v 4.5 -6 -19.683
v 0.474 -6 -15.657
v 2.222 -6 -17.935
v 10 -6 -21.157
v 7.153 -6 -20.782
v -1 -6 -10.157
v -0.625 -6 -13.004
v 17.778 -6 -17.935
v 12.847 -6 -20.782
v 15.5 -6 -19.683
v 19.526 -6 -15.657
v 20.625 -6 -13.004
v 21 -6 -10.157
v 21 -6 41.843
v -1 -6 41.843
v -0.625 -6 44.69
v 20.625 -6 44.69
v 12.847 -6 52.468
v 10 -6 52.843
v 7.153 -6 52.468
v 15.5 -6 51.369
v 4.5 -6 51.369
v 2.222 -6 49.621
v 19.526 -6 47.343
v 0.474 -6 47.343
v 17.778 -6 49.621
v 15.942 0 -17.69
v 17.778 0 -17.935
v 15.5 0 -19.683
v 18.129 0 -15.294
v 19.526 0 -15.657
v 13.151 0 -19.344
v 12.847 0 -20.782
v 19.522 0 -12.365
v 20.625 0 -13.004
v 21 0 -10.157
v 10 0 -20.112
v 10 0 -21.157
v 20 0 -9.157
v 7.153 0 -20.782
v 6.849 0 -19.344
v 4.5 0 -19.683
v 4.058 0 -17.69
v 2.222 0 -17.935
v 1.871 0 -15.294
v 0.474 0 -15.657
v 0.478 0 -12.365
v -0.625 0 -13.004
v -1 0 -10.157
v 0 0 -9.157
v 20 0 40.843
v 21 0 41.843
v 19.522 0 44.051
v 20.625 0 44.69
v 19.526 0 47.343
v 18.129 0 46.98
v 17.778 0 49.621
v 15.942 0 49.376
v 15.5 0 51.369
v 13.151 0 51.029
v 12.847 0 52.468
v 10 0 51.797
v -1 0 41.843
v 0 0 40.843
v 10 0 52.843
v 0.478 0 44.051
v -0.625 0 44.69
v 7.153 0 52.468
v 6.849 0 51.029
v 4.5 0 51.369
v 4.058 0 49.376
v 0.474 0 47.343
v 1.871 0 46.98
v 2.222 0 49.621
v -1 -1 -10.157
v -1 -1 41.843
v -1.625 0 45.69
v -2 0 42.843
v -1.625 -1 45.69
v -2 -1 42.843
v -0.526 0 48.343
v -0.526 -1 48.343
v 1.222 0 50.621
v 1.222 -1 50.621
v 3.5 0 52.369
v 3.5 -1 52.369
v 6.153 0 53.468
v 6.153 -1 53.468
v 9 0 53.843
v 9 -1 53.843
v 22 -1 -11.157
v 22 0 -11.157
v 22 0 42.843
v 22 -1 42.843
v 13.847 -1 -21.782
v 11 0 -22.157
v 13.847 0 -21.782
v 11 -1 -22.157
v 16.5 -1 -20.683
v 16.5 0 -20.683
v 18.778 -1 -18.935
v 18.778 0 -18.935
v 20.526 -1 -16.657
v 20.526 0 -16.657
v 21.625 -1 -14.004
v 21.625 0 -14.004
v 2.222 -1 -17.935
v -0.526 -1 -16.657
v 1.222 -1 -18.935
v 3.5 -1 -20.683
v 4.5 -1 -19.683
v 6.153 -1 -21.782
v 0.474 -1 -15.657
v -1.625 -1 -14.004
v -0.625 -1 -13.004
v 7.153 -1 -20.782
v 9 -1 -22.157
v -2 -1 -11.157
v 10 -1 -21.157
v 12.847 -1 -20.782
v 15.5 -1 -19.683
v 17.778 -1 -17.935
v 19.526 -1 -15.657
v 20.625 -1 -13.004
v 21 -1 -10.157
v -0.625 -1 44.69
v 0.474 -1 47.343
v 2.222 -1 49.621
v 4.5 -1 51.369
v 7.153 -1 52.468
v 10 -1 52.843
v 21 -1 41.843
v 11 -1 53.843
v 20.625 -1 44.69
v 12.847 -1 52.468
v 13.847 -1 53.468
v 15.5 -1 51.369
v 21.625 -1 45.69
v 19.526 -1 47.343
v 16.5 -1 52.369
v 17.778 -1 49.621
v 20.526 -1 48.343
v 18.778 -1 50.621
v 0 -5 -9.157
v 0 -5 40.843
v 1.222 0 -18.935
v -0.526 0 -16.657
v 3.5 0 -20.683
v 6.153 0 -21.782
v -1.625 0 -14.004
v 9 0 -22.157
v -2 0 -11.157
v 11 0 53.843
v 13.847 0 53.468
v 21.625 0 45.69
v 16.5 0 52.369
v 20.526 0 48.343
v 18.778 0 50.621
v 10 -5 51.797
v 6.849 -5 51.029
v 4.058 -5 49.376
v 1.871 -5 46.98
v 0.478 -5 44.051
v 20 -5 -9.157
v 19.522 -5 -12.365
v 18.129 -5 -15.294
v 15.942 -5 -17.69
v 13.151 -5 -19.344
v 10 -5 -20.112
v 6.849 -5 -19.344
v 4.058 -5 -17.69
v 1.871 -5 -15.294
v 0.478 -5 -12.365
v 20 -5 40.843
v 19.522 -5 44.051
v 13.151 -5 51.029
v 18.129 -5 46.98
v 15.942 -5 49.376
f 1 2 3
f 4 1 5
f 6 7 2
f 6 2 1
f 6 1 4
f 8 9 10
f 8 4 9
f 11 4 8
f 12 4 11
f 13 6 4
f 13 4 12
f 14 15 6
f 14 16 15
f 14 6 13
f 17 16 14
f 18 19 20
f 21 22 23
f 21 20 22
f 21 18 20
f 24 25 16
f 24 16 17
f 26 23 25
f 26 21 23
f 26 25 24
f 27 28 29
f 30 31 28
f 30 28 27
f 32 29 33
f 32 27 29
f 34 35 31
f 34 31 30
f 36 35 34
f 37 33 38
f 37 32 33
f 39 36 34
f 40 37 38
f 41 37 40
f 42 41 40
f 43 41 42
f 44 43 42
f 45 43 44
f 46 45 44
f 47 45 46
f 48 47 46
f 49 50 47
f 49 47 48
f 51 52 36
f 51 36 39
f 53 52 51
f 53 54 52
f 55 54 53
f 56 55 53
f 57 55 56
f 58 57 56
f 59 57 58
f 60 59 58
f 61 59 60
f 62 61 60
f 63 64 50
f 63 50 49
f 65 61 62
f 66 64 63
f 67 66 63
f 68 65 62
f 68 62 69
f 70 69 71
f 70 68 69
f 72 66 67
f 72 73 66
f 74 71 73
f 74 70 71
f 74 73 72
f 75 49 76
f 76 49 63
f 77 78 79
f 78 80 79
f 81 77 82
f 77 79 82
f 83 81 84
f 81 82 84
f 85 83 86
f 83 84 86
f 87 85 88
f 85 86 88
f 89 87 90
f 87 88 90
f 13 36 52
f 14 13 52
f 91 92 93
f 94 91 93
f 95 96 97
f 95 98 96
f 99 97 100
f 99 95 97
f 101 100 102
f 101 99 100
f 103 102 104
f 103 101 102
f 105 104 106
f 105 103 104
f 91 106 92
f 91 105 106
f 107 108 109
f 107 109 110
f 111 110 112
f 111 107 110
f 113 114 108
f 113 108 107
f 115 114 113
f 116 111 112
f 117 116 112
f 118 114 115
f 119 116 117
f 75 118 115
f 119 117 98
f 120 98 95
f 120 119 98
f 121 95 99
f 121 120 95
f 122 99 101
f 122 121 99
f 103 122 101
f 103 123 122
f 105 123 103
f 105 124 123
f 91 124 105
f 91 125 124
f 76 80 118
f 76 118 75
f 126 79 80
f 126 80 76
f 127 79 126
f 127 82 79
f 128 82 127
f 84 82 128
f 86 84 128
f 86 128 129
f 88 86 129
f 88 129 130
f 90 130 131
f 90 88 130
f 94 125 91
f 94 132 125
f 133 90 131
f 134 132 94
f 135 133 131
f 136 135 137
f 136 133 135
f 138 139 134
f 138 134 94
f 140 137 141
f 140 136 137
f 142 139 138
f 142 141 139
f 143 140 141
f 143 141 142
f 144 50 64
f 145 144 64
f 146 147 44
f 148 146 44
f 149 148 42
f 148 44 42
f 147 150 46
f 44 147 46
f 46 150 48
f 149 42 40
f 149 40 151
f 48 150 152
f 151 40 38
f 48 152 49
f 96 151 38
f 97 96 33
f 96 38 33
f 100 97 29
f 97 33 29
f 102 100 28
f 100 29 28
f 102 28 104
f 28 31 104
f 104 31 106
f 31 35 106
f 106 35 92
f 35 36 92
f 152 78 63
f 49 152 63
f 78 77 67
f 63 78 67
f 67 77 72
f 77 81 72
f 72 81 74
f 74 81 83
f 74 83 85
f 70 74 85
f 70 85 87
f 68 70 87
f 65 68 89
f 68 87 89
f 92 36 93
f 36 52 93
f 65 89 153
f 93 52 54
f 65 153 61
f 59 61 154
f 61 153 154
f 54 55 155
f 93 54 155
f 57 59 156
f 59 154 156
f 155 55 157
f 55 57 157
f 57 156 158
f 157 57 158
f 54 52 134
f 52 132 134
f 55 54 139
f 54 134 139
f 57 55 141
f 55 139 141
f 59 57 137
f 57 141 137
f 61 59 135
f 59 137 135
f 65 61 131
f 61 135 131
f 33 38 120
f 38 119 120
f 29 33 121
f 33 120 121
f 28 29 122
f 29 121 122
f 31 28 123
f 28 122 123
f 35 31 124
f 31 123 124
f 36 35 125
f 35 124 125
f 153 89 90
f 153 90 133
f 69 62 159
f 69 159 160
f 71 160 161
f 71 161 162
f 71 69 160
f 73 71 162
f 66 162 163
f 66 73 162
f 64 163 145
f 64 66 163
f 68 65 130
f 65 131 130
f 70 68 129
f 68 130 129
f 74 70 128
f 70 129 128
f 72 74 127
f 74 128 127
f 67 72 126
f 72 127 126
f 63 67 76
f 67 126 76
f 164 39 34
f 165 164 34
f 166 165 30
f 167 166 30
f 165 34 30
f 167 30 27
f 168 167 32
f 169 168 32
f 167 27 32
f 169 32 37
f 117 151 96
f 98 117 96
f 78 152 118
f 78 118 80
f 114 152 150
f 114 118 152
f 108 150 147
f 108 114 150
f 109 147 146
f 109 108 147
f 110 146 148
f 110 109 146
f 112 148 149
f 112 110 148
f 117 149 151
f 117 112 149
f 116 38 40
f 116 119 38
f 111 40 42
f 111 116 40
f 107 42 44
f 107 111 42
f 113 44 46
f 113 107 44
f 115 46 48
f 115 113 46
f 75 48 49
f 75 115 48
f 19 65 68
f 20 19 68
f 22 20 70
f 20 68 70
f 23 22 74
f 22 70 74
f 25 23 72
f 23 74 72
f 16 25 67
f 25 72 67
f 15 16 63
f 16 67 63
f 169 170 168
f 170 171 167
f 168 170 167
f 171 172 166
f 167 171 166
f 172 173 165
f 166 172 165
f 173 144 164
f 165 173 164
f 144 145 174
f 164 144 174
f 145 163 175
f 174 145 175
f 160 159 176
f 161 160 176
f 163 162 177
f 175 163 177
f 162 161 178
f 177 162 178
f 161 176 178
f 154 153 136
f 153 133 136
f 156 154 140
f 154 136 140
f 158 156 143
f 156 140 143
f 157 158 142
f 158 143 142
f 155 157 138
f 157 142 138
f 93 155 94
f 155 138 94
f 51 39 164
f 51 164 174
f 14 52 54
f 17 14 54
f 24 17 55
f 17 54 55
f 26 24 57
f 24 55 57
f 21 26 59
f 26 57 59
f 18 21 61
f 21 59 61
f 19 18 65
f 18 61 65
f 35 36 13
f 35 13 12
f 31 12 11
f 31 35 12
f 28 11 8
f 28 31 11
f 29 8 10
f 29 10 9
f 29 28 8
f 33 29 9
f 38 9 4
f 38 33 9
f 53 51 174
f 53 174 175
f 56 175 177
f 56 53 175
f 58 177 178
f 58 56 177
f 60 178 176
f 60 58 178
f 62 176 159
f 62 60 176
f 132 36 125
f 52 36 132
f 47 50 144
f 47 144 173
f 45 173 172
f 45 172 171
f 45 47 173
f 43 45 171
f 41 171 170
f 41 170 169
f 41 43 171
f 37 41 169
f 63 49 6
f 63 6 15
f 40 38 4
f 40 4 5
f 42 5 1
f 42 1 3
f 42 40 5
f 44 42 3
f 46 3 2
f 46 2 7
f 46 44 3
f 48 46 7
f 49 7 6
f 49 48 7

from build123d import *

# Parameters (mm, degrees)
F0_W          = 22
F0_H          = 74
F0_W_2        = 20
F0_H_2        = 72
F1_DEPTH      = 6
F0_W_3        = 24
F0_H_3        = 76
F2_DEPTH      = 1
F3_DEPTH      = 5
F4_F1_R       = 10.9999
F4_F2_R       = 11
F4_2_T1_DEPTH = 5
F4_2_T3_DEPTH = 61


# Not quite as in the source:
# - a fillet or chamfer that OpenCascade refuses, or shapes differently, is made with other operations: its cross-section is extruded or revolved along the edge and cut away or added
# - a fillet or chamfer is up to 0.001 mm smaller than in the source, because OpenCascade refuses the exact size


with BuildPart() as f1:
    # F0 (on Front) → F1 (new body)
    with BuildSketch(Plane.XZ):
        with Locations((10, 15.842890054)):
            Rectangle(F0_W, F0_H)
        with Locations((10, 15.842890054)):
            Rectangle(F0_W_2, F0_H_2, mode=Mode.SUBTRACT)
        with Locations((10, 15.842890054)):
            Rectangle(F0_W_2, F0_H_2)
    extrude(amount=F1_DEPTH)

    # F0 (on Front) → F3 (cut)
    with BuildSketch(Plane.XZ):
        with Locations((10, 15.842890054)):
            Rectangle(F0_W_2, F0_H_2)
    extrude(amount=F3_DEPTH, mode=Mode.SUBTRACT)

    # F4#2: fillet of radius 11 on 8 edges, made by hand

    # F4_2_s2 → F4_2_t1 (join)
    with BuildSketch(Plane.XZ):
        with BuildLine():
            ThreePointArc((20, 40.842890054), (16.7781745931, 48.621064647), (9, 51.842890054))
            Line((9, 51.842890054), (20, 51.842890054))
            Line((20, 51.842890054), (20, 40.842890054))
        make_face()
        with BuildLine():
            ThreePointArc((11, 51.842890054), (3.2218254069, 48.621064647), (0, 40.842890054))
            Line((0, 40.842890054), (0, 51.842890054))
            Line((0, 51.842890054), (11, 51.842890054))
        make_face()
        with BuildLine():
            ThreePointArc((0, -9.157109946), (3.2218254069, -16.9352845391), (11, -20.157109946))
            Line((11, -20.157109946), (0, -20.157109946))
            Line((0, -20.157109946), (0, -9.157109946))
        make_face()
        with BuildLine():
            ThreePointArc((20, -9.157109946), (16.7781745931, -16.9352845391), (9, -20.157109946))
            Line((9, -20.157109946), (20, -20.157109946))
            Line((20, -20.157109946), (20, -9.157109946))
        make_face()
    extrude(amount=F4_2_T1_DEPTH)

    # F4_2_s4 → F4_2_t3 (cut)
    with BuildSketch(Plane.XZ.offset(-27.5)):
        with BuildLine():
            ThreePointArc((21, 41.842890054), (17.7781745931, 49.621064647), (10, 52.842890054))
            Line((10, 52.842890054), (21, 52.842890054))
            Line((21, 52.842890054), (21, 41.842890054))
        make_face()
        with BuildLine():
            ThreePointArc((10, 52.842890054), (2.2218254069, 49.621064647), (-1, 41.842890054))
            Line((-1, 41.842890054), (-1, 52.842890054))
            Line((-1, 52.842890054), (10, 52.842890054))
        make_face()
        with BuildLine():
            ThreePointArc((10, -21.157109946), (2.2218254069, -17.9352845391), (-1, -10.157109946))
            Line((-1, -10.157109946), (-1, -21.157109946))
            Line((-1, -21.157109946), (10, -21.157109946))
        make_face()
        with BuildLine():
            ThreePointArc((21, -10.157109946), (17.7781745931, -17.9352845391), (10, -21.157109946))
            Line((10, -21.157109946), (21, -21.157109946))
            Line((21, -21.157109946), (21, -10.157109946))
        make_face()
    extrude(amount=F4_2_T3_DEPTH, mode=Mode.SUBTRACT)


with BuildPart() as f2:
    # F0 (on Front) → F2 (new body)
    with BuildSketch(Plane.XZ):
        with Locations((10, 15.842890054)):
            Rectangle(F0_W_3, F0_H_3)
        with Locations((10, 15.842890054)):
            Rectangle(F0_W, F0_H, mode=Mode.SUBTRACT)
    extrude(amount=F2_DEPTH)

    # F4: fillet of radius 11 on 8 edges, made by hand

    # F4_f1 (radius 11 in the source; OpenCascade refuses exactly that, so slightly less here)
    f4_f1_edges = [f2.edges().sort_by_distance(p)[0] for p in [
        (21, -0.5, 52.842890054),
        (-1, -0.5, 52.842890054),
        (-1, -0.5, -21.157109946),
        (21, -0.5, -21.157109946),
    ]]
    fillet(f4_f1_edges, radius=F4_F1_R)

    # F4_f2
    f4_f2_edges = [f2.edges().sort_by_distance(p)[0] for p in [
        (22, -0.5, 53.842890054),
        (-2, -0.5, 53.842890054),
        (-2, -0.5, -22.157109946),
        (22, -0.5, -22.157109946),
    ]]
    fillet(f4_f2_edges, radius=F4_F2_R)


solid = Compound([f1.part, f2.part])
